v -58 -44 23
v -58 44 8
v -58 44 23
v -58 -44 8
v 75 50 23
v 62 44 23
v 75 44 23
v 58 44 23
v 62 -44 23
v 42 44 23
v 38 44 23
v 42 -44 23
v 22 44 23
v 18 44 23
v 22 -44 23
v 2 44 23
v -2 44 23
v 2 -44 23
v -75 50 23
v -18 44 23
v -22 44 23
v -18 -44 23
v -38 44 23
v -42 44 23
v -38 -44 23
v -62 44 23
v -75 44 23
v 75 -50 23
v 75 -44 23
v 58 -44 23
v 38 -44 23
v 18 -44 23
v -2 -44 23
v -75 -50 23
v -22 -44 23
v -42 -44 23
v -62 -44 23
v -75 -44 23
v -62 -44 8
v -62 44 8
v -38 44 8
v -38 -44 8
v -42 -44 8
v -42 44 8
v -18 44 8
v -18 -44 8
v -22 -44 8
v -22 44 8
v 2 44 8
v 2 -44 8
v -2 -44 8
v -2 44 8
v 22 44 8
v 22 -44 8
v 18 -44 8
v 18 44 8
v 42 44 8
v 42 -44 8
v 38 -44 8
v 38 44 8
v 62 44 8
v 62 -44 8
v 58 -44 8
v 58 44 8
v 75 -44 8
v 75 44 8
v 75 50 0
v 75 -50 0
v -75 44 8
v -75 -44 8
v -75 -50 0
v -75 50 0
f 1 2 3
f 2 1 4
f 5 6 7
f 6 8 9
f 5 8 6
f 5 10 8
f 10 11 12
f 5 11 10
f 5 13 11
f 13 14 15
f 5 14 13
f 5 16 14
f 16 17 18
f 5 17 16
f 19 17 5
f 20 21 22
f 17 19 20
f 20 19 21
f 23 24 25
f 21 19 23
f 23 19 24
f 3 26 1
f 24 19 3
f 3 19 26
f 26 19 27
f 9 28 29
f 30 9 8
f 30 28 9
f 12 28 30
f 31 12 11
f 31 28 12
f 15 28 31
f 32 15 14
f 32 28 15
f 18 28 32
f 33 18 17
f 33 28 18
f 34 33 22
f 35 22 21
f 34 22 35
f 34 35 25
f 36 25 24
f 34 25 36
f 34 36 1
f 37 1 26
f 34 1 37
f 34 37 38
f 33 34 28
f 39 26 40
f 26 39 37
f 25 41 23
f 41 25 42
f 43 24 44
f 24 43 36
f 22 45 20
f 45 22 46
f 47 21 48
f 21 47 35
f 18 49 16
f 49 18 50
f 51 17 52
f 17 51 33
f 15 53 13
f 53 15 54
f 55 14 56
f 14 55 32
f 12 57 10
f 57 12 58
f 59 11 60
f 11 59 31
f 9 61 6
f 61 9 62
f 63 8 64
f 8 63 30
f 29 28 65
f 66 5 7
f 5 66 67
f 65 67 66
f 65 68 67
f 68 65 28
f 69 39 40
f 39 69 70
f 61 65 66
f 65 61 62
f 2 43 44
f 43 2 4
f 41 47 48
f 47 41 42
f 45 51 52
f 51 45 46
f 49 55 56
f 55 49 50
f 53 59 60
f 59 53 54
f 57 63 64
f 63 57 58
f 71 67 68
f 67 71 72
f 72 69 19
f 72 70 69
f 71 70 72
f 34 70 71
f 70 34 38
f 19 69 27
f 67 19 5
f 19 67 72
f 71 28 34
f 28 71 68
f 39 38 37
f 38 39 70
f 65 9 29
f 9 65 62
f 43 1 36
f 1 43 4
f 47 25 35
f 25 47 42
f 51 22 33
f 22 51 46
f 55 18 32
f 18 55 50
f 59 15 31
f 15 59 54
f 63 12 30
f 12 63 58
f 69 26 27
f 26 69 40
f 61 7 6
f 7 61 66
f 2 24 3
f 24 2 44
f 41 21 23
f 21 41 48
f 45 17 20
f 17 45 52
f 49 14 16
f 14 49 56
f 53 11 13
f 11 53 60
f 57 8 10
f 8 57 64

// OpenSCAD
$fn = 32;

// ----------------------------------------------------------------------
// Rib frame 150 x 100 x 23
// 7 ribs at 20 mm pitch
// ----------------------------------------------------------------------

// --- parameters (mm) ---
frame = [150, 100, 8];  // base plate size (x, y, z)
rail_w = 6;             // side rail width
ribs = 7;               // number of ribs
rib_t = 4;              // rib thickness
rib_h = 15;             // rib height above the base plate
pitch = 20;             // pitch between rib centres

// --- derived feature positions (mm) ---
span = (ribs - 1) * pitch;          // = 120   distance between the outer ribs
origin_x = -span / 2;               // = -60   X of the first rib
rib_len = frame[1] - 2 * rail_w + 2;  // = 90   rib length, 1 mm into each rail
feature_centers = [
  [origin_x + 0 * pitch, 0],
  [origin_x + 1 * pitch, 0],
  [origin_x + 2 * pitch, 0],
  [origin_x + 3 * pitch, 0],
  [origin_x + 4 * pitch, 0],
  [origin_x + 5 * pitch, 0],
  [origin_x + 6 * pitch, 0]
];   // rib centre line, drives the rib loop

// base plate, two side rails, then the ribs read straight off feature_centers
union() {
  translate([-frame[0] / 2, -frame[1] / 2, 0]) cube(frame);
  translate([-frame[0] / 2, -frame[1] / 2, 0]) cube([frame[0], rail_w, frame[2] + rib_h]);
  translate([-frame[0] / 2, frame[1] / 2 - rail_w, 0]) cube([frame[0], rail_w, frame[2] + rib_h]);
  for (centre = feature_centers)
    translate([centre[0] - rib_t / 2, centre[1] - rib_len / 2, frame[2] - 1])
      cube([rib_t, rib_len, rib_h + 1]);
}
